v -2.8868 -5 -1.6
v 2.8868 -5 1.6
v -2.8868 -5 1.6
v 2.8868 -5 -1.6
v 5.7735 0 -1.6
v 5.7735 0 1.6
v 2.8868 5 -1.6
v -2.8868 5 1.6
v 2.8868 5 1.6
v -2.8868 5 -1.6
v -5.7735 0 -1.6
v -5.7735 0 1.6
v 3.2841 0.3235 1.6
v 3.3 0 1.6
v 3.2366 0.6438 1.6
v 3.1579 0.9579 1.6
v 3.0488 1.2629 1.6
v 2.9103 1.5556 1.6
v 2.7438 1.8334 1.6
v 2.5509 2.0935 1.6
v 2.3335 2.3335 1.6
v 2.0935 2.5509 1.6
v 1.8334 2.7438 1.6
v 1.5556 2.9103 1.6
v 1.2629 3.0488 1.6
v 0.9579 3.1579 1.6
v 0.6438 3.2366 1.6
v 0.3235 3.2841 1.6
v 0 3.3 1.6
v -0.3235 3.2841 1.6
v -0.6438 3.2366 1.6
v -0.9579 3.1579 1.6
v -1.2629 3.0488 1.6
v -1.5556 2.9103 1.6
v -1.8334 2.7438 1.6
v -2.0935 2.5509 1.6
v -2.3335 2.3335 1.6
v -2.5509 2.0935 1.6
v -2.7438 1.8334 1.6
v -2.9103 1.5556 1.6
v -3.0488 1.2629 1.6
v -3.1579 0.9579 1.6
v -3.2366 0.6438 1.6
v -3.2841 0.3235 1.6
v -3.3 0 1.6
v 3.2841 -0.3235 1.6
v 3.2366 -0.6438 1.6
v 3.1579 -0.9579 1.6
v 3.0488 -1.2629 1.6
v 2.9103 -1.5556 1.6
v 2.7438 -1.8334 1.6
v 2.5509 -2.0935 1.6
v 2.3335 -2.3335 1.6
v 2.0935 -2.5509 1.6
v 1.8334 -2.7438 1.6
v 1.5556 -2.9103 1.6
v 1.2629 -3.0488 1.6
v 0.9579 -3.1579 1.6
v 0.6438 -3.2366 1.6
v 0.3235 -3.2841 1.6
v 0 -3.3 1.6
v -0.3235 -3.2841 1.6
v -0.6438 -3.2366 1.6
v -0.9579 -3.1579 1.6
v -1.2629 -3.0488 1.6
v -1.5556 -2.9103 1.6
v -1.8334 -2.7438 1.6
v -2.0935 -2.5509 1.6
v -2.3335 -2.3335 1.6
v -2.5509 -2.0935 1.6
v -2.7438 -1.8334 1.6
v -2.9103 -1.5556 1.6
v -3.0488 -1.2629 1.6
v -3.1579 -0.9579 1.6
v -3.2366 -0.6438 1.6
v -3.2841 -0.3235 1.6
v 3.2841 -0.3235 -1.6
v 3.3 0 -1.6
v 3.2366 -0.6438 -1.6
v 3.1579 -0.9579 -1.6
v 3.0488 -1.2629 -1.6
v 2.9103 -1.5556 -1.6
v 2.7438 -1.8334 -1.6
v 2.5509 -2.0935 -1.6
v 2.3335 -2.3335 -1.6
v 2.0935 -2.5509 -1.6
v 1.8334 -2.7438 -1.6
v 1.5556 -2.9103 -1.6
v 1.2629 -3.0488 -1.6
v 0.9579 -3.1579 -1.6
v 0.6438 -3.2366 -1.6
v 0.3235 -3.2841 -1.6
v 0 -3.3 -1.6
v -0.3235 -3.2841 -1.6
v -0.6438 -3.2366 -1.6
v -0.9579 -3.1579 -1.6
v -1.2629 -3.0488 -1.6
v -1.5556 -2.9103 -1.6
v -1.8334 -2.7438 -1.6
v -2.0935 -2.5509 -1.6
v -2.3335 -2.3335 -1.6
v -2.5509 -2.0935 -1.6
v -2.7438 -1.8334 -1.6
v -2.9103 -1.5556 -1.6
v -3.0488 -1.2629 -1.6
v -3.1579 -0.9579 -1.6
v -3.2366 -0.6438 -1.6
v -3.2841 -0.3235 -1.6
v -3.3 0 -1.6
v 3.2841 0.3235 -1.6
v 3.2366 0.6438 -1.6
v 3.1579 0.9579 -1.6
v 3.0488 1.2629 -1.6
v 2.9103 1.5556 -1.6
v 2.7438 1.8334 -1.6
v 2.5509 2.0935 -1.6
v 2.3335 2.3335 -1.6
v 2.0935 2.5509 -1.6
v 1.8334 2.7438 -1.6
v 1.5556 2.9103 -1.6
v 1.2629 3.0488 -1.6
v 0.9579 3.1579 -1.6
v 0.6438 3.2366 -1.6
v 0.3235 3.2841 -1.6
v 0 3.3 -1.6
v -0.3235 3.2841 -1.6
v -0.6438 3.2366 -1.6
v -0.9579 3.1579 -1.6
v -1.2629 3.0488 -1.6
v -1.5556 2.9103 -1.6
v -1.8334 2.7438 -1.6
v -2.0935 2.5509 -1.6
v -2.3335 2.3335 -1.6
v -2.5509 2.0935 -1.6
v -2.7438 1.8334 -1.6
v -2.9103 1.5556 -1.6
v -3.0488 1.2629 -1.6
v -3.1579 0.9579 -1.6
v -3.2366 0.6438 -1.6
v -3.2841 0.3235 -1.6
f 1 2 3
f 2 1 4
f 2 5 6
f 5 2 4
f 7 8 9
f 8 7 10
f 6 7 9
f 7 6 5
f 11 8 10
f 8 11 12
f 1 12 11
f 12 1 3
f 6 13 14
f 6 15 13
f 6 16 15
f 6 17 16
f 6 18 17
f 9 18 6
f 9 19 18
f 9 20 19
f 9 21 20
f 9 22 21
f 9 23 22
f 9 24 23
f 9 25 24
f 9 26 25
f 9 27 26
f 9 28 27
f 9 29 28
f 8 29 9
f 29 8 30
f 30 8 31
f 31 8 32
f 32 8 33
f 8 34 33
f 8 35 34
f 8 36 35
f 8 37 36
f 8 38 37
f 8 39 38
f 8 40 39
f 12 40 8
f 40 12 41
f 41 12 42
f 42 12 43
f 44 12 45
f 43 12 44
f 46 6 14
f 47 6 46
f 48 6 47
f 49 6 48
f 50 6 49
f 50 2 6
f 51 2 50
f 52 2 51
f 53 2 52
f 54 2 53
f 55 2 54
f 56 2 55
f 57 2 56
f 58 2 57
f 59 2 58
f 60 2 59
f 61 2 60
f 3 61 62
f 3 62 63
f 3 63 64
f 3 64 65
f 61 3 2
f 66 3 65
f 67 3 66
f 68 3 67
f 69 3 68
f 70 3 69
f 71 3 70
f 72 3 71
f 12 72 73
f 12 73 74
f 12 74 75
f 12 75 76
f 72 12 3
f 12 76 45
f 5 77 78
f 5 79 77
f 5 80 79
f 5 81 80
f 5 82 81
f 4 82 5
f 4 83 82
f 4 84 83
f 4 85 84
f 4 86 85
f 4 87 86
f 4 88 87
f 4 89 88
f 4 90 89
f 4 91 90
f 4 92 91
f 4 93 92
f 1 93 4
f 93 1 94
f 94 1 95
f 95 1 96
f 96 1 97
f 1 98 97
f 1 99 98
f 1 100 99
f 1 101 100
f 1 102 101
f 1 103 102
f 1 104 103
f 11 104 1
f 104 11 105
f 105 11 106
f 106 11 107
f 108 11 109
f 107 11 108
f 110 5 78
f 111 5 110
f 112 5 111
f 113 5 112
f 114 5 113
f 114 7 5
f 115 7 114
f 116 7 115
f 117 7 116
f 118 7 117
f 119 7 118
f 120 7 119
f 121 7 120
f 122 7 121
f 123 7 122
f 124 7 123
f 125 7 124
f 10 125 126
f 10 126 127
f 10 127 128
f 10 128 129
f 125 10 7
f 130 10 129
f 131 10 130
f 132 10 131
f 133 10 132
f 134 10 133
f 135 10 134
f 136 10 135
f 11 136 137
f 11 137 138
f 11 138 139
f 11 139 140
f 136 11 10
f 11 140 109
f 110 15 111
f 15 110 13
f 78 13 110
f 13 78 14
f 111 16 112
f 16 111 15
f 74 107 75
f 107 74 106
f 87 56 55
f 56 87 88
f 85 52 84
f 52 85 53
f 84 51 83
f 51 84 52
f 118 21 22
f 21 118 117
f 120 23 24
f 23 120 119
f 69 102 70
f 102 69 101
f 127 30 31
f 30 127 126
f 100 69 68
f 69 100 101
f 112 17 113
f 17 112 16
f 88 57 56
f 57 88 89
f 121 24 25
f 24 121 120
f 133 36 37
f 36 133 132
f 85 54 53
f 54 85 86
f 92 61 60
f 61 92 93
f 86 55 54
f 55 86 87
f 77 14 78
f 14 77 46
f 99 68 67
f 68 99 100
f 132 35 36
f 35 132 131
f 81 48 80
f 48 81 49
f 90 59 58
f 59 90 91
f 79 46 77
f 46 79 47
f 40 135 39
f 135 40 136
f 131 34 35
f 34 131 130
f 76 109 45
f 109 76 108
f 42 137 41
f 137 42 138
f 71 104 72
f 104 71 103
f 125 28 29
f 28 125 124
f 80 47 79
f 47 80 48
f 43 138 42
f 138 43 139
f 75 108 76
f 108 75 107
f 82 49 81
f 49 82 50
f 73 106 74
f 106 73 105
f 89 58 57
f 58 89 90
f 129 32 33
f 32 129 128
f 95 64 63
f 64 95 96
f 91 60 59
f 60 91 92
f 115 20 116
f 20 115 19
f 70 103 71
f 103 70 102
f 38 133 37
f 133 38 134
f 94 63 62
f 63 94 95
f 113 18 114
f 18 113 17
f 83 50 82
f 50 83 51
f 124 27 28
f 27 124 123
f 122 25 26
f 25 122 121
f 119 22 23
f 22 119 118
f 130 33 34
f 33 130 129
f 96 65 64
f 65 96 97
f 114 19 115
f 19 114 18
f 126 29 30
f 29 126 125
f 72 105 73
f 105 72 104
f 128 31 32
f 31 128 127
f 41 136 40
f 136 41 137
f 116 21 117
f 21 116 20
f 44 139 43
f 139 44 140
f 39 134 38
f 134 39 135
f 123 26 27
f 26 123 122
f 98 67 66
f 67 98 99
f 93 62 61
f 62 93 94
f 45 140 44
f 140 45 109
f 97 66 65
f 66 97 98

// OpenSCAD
// Thin hex nut for M6 screw: 10.0mm across flats, 3.2mm thick

thread_nominal_diameter_mm = 6.0;
across_flats_mm = 10.0;
thickness_mm = 3.2;

// Use a simple clearance hole for an M6 screw (no threads modeled)
hole_diameter_mm = 6.6;

eps_mm = 0.05;

// Derived: for a regular hex, across_flats = 2 * apothem
// OpenSCAD cylinder(r=..., $fn=6) uses circumradius (center to vertex)
hex_circumradius_mm = across_flats_mm / sqrt(3);

module thin_hex_nut() {
    difference() {
        // Hex body (flat-to-flat = across_flats_mm)
        cylinder(h=thickness_mm, r=hex_circumradius_mm, $fn=6, center=true);

        // Through hole
        cylinder(h=thickness_mm + 2*eps_mm, r=hole_diameter_mm/2, $fn=64, center=true);
    }
}

thin_hex_nut();
